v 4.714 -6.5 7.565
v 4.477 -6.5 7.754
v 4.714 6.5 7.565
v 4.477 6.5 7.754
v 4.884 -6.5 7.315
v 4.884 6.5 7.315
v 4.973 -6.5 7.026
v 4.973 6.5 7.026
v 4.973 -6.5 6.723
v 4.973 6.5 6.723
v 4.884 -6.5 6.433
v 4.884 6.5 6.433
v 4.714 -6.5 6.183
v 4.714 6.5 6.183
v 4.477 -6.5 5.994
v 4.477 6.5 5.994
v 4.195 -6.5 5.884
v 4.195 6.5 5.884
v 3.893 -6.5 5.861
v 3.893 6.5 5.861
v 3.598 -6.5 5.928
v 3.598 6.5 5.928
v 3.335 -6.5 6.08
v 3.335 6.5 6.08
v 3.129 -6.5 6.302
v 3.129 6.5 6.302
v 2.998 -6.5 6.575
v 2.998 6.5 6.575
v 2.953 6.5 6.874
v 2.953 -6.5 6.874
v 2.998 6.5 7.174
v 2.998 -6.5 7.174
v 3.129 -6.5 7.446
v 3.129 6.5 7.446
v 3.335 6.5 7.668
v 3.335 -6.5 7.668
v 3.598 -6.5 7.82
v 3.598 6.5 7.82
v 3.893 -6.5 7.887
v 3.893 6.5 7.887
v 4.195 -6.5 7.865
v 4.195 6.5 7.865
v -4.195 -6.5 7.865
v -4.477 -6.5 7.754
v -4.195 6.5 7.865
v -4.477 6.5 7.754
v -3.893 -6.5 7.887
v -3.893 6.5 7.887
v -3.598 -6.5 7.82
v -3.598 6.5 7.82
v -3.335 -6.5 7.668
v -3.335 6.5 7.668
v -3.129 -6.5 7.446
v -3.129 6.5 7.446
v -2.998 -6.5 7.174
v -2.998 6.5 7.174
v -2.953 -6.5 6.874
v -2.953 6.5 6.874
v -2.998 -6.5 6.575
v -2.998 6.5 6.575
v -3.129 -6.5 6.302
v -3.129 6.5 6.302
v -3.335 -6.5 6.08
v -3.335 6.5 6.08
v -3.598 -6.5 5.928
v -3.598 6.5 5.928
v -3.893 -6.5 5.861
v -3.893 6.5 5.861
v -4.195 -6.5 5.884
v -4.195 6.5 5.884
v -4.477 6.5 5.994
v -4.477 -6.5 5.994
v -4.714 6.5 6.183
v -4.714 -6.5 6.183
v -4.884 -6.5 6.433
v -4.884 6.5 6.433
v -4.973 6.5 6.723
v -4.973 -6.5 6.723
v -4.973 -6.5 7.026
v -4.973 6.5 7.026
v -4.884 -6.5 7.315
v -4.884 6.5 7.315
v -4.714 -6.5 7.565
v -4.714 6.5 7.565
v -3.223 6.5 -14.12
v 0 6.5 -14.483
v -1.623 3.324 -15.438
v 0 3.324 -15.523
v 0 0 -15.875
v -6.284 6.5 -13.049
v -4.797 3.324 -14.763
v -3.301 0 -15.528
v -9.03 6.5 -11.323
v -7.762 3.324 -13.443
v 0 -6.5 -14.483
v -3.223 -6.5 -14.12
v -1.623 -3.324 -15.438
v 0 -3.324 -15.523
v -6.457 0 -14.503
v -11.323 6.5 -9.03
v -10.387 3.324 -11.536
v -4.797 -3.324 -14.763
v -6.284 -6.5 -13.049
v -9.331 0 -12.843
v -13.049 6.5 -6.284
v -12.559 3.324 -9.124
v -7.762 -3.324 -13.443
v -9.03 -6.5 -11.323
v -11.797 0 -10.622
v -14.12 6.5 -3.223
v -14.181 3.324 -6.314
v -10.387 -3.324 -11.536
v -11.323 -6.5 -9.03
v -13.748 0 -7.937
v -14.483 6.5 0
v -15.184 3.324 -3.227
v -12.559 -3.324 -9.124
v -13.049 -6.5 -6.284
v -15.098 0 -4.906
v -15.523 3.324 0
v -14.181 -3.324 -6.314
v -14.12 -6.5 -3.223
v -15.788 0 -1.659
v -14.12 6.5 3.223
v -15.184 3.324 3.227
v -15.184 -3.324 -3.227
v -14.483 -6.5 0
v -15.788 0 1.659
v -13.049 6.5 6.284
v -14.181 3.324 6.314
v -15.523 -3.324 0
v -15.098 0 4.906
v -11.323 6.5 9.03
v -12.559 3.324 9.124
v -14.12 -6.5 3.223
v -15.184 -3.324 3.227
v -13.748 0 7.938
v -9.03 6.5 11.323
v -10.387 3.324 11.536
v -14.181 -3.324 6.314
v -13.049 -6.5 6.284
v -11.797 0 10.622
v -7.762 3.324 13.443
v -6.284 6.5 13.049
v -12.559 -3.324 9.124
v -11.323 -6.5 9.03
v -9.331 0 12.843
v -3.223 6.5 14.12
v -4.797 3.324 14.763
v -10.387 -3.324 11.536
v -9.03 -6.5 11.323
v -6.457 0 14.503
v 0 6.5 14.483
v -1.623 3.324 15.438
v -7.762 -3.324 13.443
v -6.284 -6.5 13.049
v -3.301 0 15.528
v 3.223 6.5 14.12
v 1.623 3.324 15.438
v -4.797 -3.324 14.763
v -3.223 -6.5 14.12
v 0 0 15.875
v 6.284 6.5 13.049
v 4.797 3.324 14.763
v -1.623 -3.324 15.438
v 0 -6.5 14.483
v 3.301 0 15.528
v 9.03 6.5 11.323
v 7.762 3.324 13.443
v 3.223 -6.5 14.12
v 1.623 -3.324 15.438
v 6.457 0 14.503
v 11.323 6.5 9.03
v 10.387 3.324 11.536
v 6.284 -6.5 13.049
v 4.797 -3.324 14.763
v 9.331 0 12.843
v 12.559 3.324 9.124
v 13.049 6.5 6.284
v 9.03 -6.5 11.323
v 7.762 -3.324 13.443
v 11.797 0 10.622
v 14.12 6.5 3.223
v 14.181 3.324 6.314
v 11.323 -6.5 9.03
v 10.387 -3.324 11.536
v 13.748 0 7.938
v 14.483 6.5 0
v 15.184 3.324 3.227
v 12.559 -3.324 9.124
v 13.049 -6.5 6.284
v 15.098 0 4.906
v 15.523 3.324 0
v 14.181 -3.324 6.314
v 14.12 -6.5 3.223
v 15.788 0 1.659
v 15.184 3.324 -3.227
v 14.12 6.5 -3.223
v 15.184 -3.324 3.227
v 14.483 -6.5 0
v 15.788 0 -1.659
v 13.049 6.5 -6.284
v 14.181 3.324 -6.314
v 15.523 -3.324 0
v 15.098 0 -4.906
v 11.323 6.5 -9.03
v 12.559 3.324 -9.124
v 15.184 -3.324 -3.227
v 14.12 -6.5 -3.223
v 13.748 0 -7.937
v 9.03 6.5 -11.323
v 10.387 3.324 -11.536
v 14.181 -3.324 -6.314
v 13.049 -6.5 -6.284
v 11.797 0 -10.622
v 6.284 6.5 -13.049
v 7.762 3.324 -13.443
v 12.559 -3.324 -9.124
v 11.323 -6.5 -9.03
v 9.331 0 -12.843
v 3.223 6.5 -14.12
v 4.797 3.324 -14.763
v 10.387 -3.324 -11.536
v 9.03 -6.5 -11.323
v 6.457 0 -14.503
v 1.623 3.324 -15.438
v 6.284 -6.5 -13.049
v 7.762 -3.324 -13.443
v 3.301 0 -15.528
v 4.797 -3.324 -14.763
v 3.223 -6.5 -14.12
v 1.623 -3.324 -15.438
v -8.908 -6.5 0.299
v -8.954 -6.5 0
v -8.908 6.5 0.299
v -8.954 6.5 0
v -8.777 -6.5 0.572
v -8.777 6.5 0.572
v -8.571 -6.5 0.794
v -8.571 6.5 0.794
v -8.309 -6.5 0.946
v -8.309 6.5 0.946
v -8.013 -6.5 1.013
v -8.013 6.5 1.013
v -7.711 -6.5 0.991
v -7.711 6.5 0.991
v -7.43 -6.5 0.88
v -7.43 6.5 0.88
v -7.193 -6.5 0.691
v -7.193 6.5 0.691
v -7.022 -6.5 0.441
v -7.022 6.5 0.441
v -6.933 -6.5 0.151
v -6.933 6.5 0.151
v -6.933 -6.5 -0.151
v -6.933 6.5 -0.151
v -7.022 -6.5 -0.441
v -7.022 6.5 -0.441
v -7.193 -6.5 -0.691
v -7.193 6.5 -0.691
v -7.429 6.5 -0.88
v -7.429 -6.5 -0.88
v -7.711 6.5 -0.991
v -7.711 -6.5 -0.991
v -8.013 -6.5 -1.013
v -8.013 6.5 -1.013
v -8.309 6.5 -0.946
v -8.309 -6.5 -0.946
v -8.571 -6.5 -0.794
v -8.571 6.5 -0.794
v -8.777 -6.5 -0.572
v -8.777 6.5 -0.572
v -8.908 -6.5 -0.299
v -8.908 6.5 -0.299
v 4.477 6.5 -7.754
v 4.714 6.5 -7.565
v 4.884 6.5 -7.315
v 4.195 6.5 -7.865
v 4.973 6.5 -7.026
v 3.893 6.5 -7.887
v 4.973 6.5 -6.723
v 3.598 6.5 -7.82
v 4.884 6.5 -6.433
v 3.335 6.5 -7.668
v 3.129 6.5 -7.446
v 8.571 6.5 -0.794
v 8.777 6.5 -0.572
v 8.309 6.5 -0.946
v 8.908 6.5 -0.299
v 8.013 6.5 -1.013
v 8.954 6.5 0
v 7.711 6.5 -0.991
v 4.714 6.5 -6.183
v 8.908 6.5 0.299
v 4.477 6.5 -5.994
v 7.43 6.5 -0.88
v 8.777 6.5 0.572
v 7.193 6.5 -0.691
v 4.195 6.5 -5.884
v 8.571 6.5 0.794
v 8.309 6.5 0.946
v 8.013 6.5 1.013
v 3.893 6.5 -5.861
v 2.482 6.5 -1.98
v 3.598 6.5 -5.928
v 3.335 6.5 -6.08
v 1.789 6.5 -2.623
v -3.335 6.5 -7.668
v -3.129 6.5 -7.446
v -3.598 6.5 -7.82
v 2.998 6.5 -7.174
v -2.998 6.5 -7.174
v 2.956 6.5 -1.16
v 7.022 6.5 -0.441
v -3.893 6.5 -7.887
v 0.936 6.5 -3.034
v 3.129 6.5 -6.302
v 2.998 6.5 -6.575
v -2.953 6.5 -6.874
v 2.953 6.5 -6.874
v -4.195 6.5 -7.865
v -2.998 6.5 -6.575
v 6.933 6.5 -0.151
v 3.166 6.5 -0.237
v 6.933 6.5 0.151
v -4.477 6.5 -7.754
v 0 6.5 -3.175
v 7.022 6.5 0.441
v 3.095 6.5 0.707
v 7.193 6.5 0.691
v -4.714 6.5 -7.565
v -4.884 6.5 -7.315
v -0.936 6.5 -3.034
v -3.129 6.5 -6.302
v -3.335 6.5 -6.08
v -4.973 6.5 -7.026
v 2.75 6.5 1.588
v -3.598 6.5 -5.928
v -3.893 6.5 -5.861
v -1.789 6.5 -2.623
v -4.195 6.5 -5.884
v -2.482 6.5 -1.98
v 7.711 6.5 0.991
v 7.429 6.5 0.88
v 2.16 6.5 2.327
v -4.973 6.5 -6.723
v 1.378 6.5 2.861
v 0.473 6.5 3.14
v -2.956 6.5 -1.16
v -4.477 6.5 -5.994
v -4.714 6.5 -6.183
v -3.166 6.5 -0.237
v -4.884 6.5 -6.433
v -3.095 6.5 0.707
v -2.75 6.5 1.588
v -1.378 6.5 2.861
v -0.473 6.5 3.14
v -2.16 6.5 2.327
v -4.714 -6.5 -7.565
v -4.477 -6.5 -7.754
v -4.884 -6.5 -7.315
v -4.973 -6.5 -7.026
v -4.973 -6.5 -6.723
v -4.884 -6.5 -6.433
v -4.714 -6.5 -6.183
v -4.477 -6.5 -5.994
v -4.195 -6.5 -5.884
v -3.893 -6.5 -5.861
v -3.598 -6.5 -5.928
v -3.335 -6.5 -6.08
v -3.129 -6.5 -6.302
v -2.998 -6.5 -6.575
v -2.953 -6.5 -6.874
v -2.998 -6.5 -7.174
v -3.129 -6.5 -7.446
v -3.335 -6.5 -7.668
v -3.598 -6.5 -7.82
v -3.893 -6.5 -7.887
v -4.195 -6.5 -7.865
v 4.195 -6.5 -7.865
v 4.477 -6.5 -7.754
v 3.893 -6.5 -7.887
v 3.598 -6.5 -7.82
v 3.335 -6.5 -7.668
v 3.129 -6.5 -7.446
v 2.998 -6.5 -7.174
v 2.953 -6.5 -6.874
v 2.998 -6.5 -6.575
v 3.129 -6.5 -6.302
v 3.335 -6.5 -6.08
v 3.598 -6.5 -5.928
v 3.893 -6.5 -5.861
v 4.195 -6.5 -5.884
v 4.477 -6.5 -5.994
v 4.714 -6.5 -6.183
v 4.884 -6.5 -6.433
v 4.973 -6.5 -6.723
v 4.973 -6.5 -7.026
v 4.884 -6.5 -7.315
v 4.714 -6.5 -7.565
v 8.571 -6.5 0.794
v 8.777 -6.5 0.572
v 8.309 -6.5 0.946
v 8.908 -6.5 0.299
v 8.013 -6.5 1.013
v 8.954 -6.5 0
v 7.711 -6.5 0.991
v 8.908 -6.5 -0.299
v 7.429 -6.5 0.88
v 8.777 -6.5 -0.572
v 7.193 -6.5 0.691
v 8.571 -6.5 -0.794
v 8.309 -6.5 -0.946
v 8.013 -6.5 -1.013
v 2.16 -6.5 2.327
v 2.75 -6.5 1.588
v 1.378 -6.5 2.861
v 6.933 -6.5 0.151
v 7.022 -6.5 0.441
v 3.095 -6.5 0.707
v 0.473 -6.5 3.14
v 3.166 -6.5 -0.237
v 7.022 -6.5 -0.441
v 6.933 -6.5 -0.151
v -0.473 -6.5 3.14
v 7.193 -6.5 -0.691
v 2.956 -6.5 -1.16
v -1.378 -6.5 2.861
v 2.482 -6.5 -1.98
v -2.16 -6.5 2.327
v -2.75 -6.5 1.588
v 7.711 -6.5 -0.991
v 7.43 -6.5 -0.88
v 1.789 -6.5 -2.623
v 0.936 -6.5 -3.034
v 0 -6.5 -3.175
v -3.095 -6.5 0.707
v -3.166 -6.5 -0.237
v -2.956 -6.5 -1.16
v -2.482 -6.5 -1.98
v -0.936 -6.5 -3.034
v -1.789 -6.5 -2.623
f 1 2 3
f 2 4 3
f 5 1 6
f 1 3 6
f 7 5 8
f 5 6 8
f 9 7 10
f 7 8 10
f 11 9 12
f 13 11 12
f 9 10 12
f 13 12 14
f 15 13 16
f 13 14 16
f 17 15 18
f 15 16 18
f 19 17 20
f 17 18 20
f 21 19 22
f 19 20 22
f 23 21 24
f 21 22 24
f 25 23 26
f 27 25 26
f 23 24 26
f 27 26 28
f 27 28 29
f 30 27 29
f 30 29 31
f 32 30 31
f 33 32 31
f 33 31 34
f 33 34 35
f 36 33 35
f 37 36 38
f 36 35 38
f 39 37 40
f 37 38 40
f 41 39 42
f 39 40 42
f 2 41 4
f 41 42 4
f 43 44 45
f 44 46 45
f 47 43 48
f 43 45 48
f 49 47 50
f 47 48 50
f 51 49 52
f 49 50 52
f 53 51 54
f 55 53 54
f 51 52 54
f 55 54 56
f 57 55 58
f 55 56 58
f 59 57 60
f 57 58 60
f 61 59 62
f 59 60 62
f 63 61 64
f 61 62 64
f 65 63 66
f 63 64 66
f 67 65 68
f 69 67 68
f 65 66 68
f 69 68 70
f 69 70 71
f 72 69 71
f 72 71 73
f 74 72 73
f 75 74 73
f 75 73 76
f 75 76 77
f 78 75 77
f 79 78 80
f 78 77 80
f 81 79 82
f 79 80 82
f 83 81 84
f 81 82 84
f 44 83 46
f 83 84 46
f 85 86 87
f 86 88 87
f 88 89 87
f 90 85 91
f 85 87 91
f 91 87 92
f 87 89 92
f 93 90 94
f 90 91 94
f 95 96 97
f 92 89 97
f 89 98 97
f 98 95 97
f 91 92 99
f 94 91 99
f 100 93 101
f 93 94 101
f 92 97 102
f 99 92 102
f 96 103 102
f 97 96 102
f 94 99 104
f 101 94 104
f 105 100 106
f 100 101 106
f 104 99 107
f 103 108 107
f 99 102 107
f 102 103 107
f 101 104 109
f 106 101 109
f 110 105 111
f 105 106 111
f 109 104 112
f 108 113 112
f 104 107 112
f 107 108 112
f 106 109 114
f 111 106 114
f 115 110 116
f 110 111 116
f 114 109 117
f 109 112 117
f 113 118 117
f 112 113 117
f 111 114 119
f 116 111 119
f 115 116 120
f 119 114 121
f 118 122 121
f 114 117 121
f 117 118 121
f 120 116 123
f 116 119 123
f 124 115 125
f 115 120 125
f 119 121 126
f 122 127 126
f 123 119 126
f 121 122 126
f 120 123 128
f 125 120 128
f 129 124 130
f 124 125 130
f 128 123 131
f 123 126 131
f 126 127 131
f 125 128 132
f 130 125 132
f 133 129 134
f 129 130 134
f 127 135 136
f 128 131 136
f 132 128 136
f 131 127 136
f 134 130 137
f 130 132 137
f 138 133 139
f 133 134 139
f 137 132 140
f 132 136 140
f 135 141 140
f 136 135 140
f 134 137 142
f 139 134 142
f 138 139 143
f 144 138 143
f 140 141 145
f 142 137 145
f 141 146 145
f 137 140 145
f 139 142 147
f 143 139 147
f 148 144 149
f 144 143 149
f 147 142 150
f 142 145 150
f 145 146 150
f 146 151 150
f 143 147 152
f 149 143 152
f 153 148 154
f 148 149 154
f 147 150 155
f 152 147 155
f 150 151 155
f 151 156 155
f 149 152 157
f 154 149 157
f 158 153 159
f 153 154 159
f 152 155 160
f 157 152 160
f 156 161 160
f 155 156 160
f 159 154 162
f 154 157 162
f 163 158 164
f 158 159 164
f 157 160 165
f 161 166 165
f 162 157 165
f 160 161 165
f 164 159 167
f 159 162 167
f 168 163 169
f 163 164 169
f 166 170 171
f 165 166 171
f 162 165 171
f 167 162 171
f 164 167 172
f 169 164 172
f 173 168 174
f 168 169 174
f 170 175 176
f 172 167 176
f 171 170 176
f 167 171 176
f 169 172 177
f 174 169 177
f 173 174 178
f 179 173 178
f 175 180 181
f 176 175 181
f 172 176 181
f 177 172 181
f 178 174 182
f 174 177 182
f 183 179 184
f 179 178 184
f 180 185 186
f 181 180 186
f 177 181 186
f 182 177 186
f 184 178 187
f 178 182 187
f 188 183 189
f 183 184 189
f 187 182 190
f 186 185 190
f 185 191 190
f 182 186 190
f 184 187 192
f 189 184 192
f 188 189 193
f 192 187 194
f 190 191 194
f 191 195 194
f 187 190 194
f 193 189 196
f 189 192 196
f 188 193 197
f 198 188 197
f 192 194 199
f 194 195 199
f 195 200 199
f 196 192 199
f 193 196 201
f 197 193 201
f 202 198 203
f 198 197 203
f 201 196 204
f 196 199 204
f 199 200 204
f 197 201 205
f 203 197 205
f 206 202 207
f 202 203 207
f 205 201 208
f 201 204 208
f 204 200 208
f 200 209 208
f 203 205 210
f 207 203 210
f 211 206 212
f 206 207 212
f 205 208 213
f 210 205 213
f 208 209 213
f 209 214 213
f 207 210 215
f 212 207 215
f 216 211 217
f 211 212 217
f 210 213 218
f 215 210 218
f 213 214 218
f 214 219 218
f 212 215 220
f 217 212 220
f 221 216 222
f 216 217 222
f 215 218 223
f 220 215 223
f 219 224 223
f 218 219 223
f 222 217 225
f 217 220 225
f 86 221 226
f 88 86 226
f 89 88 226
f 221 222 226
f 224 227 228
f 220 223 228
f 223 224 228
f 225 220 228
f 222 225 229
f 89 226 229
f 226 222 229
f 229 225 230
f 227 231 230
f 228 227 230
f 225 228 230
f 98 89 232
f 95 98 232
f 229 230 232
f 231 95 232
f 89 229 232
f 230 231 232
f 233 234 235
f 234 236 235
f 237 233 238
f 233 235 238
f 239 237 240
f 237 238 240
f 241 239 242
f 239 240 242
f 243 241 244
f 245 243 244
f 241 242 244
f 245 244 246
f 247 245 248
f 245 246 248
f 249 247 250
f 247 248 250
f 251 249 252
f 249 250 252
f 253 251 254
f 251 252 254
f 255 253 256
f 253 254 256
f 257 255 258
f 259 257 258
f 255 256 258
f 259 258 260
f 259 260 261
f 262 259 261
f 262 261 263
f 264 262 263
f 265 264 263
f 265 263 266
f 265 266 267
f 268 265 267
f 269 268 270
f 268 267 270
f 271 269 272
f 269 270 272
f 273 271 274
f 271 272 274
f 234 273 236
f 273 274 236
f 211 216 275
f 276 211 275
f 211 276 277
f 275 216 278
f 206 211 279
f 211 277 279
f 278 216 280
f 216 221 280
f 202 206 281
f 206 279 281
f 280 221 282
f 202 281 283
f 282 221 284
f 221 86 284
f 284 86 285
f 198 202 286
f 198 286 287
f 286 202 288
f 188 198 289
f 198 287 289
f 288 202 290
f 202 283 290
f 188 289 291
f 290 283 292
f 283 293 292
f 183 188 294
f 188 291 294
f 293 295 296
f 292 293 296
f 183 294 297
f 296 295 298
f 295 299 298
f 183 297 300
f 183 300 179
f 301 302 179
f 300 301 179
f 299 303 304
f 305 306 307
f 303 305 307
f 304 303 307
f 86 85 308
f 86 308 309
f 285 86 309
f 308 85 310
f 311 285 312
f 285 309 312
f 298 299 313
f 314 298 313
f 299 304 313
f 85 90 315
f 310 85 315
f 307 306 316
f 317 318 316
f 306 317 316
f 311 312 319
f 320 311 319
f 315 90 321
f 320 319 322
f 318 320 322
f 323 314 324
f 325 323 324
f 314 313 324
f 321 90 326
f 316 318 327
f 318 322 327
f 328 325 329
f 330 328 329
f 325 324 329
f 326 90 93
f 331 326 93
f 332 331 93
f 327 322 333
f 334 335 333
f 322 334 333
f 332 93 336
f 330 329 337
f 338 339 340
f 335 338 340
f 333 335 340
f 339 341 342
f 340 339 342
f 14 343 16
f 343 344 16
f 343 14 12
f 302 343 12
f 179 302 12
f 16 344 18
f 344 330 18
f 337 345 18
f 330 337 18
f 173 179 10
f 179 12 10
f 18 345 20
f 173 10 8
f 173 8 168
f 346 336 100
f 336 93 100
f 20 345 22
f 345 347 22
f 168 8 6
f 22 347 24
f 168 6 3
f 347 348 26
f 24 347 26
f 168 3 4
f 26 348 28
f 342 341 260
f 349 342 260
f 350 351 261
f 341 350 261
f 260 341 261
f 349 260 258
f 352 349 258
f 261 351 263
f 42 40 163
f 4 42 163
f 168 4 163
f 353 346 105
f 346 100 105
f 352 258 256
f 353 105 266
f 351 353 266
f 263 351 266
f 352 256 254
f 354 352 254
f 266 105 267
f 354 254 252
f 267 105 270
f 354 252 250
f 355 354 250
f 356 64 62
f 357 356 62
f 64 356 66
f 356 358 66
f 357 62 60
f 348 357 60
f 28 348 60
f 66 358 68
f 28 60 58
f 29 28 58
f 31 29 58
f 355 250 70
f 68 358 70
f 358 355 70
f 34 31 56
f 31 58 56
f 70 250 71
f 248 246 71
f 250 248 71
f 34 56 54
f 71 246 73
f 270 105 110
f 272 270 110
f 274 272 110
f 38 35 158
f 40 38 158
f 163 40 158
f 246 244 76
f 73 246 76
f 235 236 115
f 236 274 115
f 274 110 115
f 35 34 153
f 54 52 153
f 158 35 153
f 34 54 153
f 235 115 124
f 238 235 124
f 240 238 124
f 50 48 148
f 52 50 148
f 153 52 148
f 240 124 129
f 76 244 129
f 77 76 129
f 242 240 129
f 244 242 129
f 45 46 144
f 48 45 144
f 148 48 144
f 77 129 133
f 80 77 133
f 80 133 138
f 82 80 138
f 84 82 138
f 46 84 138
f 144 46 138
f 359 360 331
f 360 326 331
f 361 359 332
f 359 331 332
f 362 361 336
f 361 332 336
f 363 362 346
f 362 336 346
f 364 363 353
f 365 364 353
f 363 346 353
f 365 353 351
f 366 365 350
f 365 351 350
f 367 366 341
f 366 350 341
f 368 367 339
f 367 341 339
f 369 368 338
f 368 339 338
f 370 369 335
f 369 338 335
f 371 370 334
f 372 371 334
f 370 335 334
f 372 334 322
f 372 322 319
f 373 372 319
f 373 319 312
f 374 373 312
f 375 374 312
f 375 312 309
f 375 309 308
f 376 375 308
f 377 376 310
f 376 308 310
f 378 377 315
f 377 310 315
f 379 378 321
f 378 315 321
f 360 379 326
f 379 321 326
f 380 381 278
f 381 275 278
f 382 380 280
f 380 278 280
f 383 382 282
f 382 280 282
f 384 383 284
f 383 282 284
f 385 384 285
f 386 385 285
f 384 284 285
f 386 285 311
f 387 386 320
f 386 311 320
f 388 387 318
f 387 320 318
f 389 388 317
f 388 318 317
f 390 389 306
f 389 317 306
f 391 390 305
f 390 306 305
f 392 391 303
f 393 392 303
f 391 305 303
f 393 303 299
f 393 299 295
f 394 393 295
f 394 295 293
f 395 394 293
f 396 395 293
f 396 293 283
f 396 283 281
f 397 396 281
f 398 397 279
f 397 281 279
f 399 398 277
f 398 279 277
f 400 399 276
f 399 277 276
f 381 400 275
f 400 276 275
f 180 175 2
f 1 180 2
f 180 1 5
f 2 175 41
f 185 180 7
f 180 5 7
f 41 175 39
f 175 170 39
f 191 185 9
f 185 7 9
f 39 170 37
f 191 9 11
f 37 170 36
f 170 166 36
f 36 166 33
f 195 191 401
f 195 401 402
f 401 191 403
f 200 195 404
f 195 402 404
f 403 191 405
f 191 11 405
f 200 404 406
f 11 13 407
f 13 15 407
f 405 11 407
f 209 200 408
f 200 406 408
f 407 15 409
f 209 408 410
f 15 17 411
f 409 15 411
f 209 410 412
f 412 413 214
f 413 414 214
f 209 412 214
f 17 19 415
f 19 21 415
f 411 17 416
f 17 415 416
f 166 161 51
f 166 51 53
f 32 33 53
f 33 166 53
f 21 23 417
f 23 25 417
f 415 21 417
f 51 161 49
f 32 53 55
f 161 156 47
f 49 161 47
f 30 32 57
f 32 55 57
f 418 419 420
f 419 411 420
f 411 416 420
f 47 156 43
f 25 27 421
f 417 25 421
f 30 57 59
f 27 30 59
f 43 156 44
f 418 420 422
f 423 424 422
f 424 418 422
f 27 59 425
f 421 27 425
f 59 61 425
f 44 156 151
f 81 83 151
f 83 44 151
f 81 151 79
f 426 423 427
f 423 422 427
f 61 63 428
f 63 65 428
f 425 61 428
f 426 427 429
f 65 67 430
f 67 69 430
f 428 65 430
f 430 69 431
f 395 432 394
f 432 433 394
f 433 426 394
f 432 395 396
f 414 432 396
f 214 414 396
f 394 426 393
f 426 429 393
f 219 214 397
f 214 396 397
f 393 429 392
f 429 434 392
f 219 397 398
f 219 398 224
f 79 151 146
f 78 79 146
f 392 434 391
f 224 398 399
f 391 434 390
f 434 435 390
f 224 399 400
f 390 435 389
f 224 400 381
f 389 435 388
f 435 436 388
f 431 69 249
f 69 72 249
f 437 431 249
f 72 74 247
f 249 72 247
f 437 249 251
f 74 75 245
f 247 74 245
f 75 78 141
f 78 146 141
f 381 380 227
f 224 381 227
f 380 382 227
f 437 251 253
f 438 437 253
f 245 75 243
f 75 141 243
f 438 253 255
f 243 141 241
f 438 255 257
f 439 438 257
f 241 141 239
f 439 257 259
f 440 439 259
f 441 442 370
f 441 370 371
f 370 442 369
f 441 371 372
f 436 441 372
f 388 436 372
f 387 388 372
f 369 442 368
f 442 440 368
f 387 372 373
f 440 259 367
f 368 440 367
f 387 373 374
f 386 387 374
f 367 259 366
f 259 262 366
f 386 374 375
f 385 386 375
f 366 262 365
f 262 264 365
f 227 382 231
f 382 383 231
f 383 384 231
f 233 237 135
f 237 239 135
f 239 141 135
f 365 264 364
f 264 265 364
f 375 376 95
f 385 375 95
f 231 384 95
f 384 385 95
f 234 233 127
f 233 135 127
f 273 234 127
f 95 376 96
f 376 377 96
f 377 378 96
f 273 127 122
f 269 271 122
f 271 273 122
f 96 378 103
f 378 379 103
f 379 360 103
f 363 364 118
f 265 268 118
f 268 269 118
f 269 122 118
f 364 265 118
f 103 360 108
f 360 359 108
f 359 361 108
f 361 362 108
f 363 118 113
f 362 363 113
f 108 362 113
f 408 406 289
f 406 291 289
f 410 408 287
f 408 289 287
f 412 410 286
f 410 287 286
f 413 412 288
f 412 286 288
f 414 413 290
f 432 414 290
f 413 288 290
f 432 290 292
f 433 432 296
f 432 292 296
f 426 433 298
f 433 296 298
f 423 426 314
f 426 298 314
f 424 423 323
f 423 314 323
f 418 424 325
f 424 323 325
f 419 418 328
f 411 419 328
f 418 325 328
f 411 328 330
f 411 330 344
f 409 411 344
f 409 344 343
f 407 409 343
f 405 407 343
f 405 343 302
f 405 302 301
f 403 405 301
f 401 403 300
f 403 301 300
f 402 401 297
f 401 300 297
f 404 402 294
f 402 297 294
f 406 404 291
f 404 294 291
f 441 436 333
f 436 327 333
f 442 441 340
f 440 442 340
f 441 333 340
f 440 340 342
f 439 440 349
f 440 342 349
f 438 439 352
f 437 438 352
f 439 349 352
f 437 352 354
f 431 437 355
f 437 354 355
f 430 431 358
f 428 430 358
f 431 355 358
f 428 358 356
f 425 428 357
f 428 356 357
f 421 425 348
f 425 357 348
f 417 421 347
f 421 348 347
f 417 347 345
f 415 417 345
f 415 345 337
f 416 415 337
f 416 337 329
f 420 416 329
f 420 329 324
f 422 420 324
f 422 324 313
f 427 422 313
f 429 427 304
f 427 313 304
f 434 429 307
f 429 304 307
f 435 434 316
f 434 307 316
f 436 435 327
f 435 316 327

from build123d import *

# Parameters (mm, degrees)
SKETCH3_R          = 1.016
CUT_EXTRUDE1_DEPTH = 7.5
CIRPATTERN1_COUNT  = 6


with BuildPart() as part:
    # Sketch1 → Revolve1 (revolve)
    with BuildSketch(Plane(origin=(0, 0, 0), x_dir=(0, 0, -1), z_dir=(1, 0, 0))):
        with BuildLine():
            Line((3.175, 6.5), (14.483287783, 6.5))
            ThreePointArc((14.483287783, 6.5), (15.875, 0), (14.483287783, -6.5))
            Line((14.483287783, -6.5), (3.175, -6.5))
            Line((3.175, -6.5), (3.175, 6.5))
        make_face()
    revolve(axis=Axis((0, -6.5, 0), (0, 1, 0)))

    # Sketch3 → Cut-Extrude1 (cut, symmetric)
    with BuildSketch(Plane(origin=(0, 0, 0), x_dir=(1, 0, 0), z_dir=(0, 1, 0))):
        with Locations((7.9375, 0)):
            Circle(SKETCH3_R)
    cut_extrude1 = extrude(amount=CUT_EXTRUDE1_DEPTH, both=True, mode=Mode.SUBTRACT)

    # CirPattern1: Cut-Extrude1 ×6 about axis
    cirpattern1_axis = Axis((0, 0, 0), (0, 1, 0))
    for i in range(1, CIRPATTERN1_COUNT):
        add(cut_extrude1.rotate(cirpattern1_axis, i * 360 / CIRPATTERN1_COUNT), mode=Mode.SUBTRACT)


solid = part.part
